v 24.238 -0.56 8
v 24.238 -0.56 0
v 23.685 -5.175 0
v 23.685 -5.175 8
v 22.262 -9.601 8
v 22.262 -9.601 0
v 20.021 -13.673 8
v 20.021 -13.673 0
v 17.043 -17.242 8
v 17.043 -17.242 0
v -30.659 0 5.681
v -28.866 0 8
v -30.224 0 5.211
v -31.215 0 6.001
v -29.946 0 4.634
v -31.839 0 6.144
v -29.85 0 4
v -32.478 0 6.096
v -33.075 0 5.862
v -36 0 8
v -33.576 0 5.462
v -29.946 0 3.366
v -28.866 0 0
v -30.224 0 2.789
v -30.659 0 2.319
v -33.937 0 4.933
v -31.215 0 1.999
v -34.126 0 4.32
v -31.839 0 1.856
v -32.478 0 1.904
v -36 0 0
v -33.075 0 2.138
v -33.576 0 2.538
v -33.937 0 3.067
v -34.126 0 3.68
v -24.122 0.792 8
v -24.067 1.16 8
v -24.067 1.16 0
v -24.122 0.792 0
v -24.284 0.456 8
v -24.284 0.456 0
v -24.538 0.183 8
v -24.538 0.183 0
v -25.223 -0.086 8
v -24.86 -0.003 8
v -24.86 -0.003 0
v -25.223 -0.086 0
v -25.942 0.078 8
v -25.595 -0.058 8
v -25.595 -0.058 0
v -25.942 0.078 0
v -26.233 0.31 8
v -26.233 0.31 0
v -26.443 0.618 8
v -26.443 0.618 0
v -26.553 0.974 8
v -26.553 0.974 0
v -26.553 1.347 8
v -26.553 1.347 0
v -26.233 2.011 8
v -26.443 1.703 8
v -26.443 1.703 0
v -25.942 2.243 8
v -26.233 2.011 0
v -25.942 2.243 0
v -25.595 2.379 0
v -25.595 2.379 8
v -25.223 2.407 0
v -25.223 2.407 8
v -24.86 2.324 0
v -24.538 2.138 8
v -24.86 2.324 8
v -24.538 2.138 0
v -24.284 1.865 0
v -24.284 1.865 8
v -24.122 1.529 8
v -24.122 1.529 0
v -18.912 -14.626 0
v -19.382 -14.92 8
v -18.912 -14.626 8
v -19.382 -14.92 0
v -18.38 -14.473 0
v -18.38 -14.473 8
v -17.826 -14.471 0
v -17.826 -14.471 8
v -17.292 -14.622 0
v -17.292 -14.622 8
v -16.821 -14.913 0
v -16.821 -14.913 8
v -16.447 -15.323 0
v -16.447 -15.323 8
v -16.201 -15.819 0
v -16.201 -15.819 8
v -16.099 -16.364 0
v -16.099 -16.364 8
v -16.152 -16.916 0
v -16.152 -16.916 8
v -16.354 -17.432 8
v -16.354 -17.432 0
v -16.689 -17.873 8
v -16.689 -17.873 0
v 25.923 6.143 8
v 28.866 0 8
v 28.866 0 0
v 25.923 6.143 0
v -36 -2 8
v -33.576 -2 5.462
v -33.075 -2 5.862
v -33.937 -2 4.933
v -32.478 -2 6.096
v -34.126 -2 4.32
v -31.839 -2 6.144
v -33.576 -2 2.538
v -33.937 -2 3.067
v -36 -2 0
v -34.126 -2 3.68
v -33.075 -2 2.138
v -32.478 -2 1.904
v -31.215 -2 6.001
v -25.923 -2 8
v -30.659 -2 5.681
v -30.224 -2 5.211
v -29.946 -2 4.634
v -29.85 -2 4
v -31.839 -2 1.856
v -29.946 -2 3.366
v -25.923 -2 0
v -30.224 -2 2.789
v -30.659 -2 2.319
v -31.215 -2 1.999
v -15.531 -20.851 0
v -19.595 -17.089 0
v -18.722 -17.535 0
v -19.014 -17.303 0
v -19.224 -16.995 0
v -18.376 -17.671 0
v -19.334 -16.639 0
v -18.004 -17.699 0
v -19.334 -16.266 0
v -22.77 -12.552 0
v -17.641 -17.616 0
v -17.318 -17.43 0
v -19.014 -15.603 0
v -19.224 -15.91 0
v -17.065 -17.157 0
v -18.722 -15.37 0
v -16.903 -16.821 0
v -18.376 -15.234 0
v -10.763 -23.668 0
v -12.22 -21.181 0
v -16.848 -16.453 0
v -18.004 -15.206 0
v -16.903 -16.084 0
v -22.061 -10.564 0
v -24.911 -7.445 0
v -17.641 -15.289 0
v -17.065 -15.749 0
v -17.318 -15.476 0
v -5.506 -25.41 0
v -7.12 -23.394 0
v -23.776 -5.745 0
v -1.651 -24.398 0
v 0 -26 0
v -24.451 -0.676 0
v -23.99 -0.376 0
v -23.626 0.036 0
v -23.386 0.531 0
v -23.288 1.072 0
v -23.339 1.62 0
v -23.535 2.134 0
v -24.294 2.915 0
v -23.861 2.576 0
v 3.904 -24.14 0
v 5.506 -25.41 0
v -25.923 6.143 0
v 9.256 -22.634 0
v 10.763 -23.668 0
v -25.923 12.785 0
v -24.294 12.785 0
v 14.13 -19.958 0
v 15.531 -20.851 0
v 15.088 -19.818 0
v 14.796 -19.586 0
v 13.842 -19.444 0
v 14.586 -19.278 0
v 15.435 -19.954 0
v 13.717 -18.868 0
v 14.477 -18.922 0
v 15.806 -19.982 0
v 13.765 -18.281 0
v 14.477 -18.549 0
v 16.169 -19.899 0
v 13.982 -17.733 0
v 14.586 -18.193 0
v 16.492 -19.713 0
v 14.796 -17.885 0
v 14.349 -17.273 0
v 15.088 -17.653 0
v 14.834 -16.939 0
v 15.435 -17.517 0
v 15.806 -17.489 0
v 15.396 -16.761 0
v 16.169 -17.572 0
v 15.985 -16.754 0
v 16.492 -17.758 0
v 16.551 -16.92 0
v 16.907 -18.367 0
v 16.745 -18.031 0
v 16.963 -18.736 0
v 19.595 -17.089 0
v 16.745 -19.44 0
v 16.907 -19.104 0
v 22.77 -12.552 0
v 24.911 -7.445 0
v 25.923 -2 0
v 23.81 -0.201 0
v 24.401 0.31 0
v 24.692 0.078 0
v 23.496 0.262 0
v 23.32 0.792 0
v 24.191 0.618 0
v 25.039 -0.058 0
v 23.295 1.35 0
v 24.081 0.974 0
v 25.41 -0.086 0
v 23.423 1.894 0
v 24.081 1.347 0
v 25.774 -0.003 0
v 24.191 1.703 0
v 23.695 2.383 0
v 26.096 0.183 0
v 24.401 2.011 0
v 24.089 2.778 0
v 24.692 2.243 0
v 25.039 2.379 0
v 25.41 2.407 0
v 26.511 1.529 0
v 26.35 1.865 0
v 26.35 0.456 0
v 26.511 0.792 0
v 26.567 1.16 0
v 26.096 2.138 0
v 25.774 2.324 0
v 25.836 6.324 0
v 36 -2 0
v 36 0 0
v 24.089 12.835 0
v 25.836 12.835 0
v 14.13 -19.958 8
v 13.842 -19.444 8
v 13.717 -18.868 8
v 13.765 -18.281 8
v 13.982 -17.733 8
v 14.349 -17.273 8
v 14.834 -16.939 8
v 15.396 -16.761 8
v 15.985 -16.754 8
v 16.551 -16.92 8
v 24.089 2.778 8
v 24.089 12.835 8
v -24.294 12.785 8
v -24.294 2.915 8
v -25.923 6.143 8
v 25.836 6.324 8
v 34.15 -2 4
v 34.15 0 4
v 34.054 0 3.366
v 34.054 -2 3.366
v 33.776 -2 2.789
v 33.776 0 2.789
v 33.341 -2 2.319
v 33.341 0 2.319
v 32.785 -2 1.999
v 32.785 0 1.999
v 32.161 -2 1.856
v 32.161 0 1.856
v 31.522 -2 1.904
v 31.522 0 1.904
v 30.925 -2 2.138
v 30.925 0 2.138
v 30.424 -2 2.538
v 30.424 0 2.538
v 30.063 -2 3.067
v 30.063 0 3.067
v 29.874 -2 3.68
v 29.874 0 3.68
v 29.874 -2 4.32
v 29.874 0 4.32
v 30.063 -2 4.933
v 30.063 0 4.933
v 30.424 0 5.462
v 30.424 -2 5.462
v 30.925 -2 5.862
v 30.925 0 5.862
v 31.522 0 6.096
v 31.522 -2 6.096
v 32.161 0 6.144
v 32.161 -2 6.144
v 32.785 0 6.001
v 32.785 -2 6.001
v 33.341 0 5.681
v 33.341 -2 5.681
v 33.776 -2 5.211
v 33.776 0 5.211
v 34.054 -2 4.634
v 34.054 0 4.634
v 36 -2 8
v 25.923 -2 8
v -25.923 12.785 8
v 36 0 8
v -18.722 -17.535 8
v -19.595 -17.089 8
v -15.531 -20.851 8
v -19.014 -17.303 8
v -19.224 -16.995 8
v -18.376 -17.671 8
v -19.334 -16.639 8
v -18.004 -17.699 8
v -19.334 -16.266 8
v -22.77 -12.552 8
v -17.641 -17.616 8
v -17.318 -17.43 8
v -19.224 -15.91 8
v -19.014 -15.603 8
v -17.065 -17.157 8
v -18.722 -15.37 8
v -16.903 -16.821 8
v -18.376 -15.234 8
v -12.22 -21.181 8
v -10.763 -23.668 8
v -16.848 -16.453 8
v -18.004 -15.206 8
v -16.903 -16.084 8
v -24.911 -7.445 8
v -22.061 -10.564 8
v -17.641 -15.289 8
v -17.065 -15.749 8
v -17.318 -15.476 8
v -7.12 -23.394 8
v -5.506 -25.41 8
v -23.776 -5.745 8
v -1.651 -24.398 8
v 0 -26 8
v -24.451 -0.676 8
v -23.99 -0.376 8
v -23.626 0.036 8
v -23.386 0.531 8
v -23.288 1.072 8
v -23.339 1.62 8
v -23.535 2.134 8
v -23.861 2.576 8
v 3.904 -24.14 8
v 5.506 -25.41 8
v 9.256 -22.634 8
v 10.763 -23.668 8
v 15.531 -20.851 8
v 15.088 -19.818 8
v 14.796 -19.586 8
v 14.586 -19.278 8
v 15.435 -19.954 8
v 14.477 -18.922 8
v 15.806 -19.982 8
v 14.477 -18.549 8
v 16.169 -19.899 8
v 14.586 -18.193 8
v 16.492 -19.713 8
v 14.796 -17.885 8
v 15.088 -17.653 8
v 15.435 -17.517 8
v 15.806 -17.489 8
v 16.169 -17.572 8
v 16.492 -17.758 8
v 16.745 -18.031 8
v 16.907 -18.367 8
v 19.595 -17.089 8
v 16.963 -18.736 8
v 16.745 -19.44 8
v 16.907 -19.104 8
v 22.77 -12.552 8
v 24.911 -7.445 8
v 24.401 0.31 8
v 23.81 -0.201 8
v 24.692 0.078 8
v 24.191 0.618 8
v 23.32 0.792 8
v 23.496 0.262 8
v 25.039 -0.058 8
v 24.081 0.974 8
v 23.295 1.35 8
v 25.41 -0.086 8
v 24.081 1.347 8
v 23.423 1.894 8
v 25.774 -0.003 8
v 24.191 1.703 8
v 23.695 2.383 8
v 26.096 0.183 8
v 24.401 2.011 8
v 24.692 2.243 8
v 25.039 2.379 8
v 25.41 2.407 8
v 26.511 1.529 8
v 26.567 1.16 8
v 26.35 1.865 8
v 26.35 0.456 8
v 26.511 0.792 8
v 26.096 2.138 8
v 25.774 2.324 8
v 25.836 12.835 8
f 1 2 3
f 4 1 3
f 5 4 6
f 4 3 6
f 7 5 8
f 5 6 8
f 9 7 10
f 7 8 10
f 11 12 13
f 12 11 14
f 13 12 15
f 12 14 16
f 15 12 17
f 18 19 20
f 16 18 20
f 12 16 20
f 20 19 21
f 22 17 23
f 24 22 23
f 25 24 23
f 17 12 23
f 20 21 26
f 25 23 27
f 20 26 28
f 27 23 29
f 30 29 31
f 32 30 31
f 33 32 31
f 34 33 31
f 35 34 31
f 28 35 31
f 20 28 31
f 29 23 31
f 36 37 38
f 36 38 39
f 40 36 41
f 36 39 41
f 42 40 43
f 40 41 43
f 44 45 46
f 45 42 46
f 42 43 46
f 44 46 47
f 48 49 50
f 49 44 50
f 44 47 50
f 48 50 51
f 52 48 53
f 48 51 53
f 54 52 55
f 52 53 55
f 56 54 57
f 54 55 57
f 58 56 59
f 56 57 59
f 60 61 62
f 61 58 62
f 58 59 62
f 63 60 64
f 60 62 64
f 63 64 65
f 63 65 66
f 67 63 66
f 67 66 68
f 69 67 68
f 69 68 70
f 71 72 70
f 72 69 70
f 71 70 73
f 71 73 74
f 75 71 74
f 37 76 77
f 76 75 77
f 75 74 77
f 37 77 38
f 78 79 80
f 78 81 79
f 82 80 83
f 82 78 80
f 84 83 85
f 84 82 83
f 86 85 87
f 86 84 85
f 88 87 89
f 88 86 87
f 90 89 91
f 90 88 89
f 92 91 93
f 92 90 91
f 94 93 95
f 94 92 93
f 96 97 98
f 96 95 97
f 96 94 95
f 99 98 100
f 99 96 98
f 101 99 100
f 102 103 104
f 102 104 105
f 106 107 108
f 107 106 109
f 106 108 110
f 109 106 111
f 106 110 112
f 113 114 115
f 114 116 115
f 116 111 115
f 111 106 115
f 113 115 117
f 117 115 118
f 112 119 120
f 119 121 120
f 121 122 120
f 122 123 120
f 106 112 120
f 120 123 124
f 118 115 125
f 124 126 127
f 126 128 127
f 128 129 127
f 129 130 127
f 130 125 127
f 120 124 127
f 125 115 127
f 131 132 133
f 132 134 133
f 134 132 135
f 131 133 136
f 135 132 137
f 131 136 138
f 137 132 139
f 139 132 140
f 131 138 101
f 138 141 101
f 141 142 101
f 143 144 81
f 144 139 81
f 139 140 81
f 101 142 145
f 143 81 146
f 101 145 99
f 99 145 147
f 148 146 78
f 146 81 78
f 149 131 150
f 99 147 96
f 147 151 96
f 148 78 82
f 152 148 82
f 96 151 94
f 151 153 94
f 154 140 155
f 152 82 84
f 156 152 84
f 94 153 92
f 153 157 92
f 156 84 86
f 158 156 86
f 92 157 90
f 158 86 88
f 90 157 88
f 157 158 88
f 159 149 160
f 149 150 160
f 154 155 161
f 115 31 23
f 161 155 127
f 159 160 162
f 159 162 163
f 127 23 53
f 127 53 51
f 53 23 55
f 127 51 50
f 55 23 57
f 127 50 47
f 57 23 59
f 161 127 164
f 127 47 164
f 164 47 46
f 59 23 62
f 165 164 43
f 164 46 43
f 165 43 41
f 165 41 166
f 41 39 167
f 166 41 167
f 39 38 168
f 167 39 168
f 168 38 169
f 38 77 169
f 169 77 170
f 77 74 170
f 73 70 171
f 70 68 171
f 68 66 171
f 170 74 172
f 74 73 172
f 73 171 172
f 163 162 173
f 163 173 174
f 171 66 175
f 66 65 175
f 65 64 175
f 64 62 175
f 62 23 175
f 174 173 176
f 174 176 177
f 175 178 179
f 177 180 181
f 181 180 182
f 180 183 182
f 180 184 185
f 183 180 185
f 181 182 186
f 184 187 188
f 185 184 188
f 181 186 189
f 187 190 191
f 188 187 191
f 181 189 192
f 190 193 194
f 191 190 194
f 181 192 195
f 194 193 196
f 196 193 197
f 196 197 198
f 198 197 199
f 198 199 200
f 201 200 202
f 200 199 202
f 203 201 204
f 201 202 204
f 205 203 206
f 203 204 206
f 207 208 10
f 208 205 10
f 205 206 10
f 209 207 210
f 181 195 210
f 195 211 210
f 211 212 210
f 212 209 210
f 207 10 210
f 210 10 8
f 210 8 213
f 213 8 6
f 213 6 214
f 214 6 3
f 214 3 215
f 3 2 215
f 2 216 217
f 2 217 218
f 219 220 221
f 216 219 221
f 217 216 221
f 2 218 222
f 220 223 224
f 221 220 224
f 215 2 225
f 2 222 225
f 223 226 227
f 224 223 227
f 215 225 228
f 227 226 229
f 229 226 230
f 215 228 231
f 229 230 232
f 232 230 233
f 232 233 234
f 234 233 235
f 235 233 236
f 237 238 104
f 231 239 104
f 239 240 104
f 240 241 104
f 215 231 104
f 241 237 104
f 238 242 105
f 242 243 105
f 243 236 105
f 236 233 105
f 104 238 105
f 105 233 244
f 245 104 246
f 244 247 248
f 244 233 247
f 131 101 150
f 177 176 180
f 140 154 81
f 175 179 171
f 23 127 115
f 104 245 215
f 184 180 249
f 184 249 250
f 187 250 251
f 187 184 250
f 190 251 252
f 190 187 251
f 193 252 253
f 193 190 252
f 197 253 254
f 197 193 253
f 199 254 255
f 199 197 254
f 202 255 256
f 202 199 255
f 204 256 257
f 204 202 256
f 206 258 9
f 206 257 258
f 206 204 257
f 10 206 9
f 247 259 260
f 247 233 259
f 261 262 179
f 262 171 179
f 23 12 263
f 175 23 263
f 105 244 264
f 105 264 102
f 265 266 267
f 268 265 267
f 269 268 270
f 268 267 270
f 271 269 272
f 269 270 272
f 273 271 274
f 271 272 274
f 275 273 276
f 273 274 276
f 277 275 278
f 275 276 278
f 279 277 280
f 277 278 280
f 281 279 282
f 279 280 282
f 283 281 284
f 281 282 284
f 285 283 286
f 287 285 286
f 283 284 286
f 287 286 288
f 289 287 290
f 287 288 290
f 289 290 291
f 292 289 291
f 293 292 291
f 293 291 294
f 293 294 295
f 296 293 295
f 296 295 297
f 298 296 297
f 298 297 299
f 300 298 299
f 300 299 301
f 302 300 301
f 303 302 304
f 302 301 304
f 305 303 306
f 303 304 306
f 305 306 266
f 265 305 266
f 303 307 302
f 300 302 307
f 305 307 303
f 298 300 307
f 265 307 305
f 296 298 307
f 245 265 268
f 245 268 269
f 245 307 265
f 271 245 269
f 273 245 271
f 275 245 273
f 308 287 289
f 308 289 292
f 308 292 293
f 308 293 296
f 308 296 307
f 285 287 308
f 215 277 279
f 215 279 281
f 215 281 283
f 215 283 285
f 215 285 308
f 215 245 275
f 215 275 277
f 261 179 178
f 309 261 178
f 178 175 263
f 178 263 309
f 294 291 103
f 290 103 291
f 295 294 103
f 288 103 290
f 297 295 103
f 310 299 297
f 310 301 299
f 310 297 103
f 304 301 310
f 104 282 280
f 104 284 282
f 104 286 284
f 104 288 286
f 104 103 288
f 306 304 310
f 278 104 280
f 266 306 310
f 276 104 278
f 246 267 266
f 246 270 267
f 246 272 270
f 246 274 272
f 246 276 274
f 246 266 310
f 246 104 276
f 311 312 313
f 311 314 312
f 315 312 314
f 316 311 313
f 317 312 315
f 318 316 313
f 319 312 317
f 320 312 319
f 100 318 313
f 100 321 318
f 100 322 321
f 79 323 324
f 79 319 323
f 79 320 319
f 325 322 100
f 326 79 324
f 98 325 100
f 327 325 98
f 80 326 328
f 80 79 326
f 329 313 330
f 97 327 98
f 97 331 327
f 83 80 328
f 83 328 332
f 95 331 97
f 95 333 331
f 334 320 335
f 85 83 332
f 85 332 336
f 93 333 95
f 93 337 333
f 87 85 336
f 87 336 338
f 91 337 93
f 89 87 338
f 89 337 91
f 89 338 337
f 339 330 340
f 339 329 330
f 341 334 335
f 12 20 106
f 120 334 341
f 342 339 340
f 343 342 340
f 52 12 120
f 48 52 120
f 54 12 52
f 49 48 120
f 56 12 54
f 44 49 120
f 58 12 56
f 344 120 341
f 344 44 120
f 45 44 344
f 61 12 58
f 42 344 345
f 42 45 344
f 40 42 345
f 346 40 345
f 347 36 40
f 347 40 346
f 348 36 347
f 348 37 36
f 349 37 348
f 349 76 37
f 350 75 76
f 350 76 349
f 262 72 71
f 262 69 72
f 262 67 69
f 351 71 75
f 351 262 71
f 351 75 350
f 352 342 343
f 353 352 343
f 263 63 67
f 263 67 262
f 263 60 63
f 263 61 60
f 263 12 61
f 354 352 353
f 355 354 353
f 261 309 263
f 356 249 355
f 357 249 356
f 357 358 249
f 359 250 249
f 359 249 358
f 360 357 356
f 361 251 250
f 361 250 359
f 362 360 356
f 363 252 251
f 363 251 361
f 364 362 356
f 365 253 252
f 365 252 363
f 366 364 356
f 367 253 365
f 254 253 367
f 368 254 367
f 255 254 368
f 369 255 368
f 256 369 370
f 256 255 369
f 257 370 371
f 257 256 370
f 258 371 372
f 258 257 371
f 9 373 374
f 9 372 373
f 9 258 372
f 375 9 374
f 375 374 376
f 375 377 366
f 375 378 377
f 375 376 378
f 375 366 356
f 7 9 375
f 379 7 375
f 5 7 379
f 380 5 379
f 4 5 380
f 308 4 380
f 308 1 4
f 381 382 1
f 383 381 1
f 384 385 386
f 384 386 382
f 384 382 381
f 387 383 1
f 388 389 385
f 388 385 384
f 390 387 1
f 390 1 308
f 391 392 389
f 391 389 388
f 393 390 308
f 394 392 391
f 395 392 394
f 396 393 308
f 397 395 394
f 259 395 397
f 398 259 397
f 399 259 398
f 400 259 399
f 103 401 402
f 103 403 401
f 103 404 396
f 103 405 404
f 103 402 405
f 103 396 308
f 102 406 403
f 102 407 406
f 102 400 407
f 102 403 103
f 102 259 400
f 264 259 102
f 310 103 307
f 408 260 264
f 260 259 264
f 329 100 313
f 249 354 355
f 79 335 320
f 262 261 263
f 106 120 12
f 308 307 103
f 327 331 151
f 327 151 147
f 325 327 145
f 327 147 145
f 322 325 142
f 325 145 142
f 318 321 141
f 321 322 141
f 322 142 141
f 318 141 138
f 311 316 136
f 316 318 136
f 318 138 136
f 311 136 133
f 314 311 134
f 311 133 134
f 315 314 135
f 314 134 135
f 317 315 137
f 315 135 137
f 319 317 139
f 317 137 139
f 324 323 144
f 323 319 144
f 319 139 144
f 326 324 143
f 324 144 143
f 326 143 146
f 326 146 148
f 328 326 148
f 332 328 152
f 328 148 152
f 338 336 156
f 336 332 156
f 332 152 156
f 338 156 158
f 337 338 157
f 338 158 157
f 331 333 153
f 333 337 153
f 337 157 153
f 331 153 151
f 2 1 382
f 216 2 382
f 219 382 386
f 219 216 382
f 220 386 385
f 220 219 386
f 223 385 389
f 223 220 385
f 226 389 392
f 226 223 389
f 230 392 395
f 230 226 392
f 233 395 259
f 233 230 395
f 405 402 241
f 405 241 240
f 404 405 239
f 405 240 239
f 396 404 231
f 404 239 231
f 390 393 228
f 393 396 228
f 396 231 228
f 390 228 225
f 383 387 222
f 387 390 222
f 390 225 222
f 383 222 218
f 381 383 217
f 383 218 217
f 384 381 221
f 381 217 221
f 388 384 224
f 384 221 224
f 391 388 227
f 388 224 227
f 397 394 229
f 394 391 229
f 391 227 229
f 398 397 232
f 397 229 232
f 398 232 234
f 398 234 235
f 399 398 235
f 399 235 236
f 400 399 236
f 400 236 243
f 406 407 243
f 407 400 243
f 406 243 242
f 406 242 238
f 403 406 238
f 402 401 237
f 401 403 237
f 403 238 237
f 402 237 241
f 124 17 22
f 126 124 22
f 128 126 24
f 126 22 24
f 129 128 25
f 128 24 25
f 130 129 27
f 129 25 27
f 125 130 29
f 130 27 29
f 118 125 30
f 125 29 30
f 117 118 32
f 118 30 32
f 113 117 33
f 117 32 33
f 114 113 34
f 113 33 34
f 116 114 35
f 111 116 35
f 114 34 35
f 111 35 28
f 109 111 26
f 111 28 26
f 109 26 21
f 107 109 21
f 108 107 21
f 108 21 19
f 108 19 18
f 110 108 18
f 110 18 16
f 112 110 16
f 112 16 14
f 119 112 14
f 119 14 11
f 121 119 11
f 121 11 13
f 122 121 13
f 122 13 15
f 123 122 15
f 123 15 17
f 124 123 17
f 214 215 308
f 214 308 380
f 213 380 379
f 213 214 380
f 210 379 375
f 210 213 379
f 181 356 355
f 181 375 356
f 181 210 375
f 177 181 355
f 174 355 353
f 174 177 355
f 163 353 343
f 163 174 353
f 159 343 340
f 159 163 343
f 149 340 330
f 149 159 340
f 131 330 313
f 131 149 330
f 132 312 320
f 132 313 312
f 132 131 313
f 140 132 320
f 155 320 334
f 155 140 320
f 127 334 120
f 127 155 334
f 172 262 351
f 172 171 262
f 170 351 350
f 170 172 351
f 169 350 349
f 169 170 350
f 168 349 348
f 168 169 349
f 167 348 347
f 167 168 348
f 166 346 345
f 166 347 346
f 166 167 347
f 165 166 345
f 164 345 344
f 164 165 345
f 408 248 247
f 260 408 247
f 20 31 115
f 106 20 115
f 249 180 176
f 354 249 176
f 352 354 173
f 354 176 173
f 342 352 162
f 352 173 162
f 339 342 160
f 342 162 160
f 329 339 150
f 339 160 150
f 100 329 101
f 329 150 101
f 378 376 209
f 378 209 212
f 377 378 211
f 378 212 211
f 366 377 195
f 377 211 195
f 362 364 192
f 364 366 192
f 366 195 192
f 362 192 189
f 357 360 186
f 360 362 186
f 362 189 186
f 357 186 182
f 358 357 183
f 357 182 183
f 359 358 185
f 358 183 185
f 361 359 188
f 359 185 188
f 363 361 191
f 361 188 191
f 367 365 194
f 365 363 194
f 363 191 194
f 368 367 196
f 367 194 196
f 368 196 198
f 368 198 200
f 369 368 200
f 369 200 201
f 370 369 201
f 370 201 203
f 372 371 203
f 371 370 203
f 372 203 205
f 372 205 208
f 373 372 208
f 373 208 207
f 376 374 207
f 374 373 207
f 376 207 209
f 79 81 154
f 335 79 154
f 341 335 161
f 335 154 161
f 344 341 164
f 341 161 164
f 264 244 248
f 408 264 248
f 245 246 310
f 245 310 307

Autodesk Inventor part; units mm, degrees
ref_plane "YZ Plane" through (0, 0, 0) normal (1, 0, 0) x (0, 1, 0)
ref_plane "XZ Plane" through (0, 0, 0) normal (0, 1, 0) x (-1, 0, 0)
ref_plane "XY Plane" through (0, 0, 0) normal (0, 0, 1) x (1, 0, 0)
sketch "Esquisse1" plane through (0, 0, 0) normal (0, 0, 1) x (1, 0, 0)
  line L0 (0, 0) -> (-27.546, -25.0426) construction
  line L1 (0, 0) -> (23.0277, -27.4577) construction
  circle A0 centre (-18.0975, -16.4528) radius 1.25
  circle A1 centre (15.7127, -18.7355) radius 1.25
  arc A2 (-16.6894, -17.8731) -> (14.1299, -19.9581) centre (0, 0) ccw
  arc A3 (-16.6894, -17.8731) -> (-19.3824, -14.9201) centre (-18.0975, -16.4528) ccw
  arc A4 (17.0433, -17.2424) -> (14.1299, -19.9581) centre (15.7127, -18.7355) ccw
  line L2 (0, 0) -> (-29.5508, 10.7556) construction
  line L3 (-17.8311, 0) -> (17.1748, 0) construction
  line L4 (0, 2.0526) -> (0, -2.2236) construction
  line L5 (-28.8657, 0) -> (-36, 0)
  line L6 (28.8657, 0) -> (36, 0)
  line L7 (36, 0) -> (36, -2)
  line L8 (36, -2) -> (25.923, -2)
  line L9 (-36, 0) -> (-36, -2)
  line L10 (-36, -2) -> (-25.923, -2)
  arc A5 (-25.923, -2) -> (25.923, -2) centre (0, 0) ccw
  circle A6 centre (0, 0) radius 22.5 construction
  arc A7 (-16.6894, -17.8731) -> (14.1299, -19.9581) centre (0, 0) ccw
  arc A8 (-16.6894, -17.8731) -> (14.1299, -19.9581) centre (0, 0) ccw
  circle A9 centre (-25.3169, 1.1605) radius 1.25
  circle A10 centre (25.3169, 1.1605) radius 1.25
  line L11 (24.0891, 2.7784) -> (24.0891, 12.8348)
  line L12 (25.8363, 12.8348) -> (24.0891, 12.8348)
  line L13 (-25.923, 6.143) -> (-25.923, 12.7847)
  line L14 (-24.2942, 2.9148) -> (-24.2942, 12.7847)
  line L15 (-24.2942, 12.7847) -> (-25.923, 12.7847)
  arc A11 (-24.4506, -0.676) -> (-19.3824, -14.9201) centre (0, 0) ccw
  arc A12 (-24.4506, -0.676) -> (-19.3824, -14.9201) centre (0, 0) ccw
  arc A13 (-24.4506, -0.676) -> (-24.2942, 2.9148) centre (-25.3169, 1.1605) ccw
  arc A14 (17.0433, -17.2424) -> (24.2376, -0.5599) centre (0, 0) ccw
  arc A15 (17.0433, -17.2424) -> (24.2376, -0.5599) centre (0, 0) ccw
  arc A16 (17.0433, -17.2424) -> (24.2376, -0.5599) centre (0, 0) ccw
  arc A17 (24.0891, 2.7784) -> (24.2376, -0.5599) centre (25.3169, 1.1605) ccw
  line L16 (-28.8657, 0) -> (-25.923, 6.143)
  line L17 (28.8657, 0) -> (25.923, 6.143)
  line L18 (25.8363, 3.0919) -> (25.8363, 3.124)
  line L19 (25.8363, 6.3239) -> (25.8363, 12.8348)
  line L20 (25.8363, 6.3239) -> (28.8657, 0)
  point P0 (-26.3114, 9.5766)
  dimension "d35" = 2.5
  dimension "d36" = 2.5
  dimension "d37" = 4
  dimension "d38" = 4
  dimension "d39" = 20
  dimension "d44" = 2
  dimension "d45" = 2
  dimension "d52" = 45
  dimension "d65" = 2.5
ref_plane "Plan de construction1" through (-42, 0, 0) normal (0, 1, 0) x (1, 0, 0)
ref_plane "Plan de construction2" through (-36, 0, 0) normal (0, 1, 0) x (1, 0, 0)
sketch "Esquisse3" plane through (-36, 0, 0) normal (0, 1, 0) x (1, 0, 0)
  line L0 (0, 0) -> (10, 0) projected
  line L1 (0, 0) -> (0, -8) projected
  line L2 (10, -8) -> (0, -8) projected
  line L3 (10, 0) -> (10, -8) projected
  circle A0 centre (4, -4) radius 2.15
  line L4 (62, 0) -> (72, 0) projected
  line L5 (62, 0) -> (62, -8) projected
  line L6 (72, -8) -> (62, -8) projected
  line L7 (72, 0) -> (72, -8) projected
  circle A1 centre (68, -4) radius 2.15
  point P0 (36, 0)
  dimension "d48" = 4.3
  dimension "d73" = 4
  dimension "d74" = 4.3
  dimension "d75" = 4
extrude "Extrusion14" add sketch "Esquisse1" along normal blind 8
extrude "Extrusion15" cut sketch "Esquisse3" against normal blind 8 contours A0 | A1
sketch "Esquisse4" plane through (0, 0, 8) normal (0, 0, 1) x (1, 0, 0)
  circle A0 centre (25.3169, 1.1605) radius 1.25 projected
  circle A1 centre (-25.3169, 1.1605) radius 1.25 projected
  circle A2 centre (15.7127, -18.7355) radius 1.25 projected
  circle A3 centre (-18.0975, -16.4528) radius 1.25 projected
  arc A4 (-16.6894, -17.8731) -> (-19.3824, -14.9201) centre (-18.0975, -16.4528) ccw projected
  arc A5 (-24.4506, -0.676) -> (-19.3824, -14.9201) centre (0, 0) ccw projected
  arc A6 (-24.4506, -0.676) -> (-24.2942, 2.9148) centre (-25.3169, 1.1605) ccw projected
  line L0 (-24.2942, 2.9148) -> (-24.2942, 12.7847) projected
  line L1 (-24.2942, 12.7847) -> (-25.923, 12.7847) projected
  line L2 (-25.923, 12.7847) -> (-25.923, 6.143) projected
  line L3 (-25.923, 6.143) -> (-28.8657, 0) projected
  line L4 (-28.8657, 0) -> (-36, 0) projected
  line L5 (-36, 0) -> (-36, -2) projected
  line L6 (-36, -2) -> (-25.923, -2) projected
  arc A7 (-25.923, -2) -> (25.923, -2) centre (0, 0) ccw projected
  line L7 (25.923, -2) -> (36, -2) projected
  line L8 (36, -2) -> (36, 0) projected
  line L9 (36, 0) -> (28.8657, 0) projected
  line L10 (28.8657, 0) -> (25.8363, 6.3239) projected
  line L11 (25.8363, 6.3239) -> (25.8363, 12.8348) projected
  line L12 (25.8363, 12.8348) -> (24.0891, 12.8348) projected
  line L13 (24.0891, 12.8348) -> (24.0891, 2.7784) projected
  arc A8 (24.0891, 2.7784) -> (24.2376, -0.5599) centre (25.3169, 1.1605) ccw projected
  arc A9 (17.0433, -17.2424) -> (24.2376, -0.5599) centre (0, 0) ccw projected
  arc A10 (17.0433, -17.2424) -> (14.1299, -19.9581) centre (15.7127, -18.7355) ccw projected
  arc A11 (-16.6894, -17.8731) -> (14.1299, -19.9581) centre (0, 0) ccw projected
  dimension "d78" = 2.5
properties part number "anneau"
